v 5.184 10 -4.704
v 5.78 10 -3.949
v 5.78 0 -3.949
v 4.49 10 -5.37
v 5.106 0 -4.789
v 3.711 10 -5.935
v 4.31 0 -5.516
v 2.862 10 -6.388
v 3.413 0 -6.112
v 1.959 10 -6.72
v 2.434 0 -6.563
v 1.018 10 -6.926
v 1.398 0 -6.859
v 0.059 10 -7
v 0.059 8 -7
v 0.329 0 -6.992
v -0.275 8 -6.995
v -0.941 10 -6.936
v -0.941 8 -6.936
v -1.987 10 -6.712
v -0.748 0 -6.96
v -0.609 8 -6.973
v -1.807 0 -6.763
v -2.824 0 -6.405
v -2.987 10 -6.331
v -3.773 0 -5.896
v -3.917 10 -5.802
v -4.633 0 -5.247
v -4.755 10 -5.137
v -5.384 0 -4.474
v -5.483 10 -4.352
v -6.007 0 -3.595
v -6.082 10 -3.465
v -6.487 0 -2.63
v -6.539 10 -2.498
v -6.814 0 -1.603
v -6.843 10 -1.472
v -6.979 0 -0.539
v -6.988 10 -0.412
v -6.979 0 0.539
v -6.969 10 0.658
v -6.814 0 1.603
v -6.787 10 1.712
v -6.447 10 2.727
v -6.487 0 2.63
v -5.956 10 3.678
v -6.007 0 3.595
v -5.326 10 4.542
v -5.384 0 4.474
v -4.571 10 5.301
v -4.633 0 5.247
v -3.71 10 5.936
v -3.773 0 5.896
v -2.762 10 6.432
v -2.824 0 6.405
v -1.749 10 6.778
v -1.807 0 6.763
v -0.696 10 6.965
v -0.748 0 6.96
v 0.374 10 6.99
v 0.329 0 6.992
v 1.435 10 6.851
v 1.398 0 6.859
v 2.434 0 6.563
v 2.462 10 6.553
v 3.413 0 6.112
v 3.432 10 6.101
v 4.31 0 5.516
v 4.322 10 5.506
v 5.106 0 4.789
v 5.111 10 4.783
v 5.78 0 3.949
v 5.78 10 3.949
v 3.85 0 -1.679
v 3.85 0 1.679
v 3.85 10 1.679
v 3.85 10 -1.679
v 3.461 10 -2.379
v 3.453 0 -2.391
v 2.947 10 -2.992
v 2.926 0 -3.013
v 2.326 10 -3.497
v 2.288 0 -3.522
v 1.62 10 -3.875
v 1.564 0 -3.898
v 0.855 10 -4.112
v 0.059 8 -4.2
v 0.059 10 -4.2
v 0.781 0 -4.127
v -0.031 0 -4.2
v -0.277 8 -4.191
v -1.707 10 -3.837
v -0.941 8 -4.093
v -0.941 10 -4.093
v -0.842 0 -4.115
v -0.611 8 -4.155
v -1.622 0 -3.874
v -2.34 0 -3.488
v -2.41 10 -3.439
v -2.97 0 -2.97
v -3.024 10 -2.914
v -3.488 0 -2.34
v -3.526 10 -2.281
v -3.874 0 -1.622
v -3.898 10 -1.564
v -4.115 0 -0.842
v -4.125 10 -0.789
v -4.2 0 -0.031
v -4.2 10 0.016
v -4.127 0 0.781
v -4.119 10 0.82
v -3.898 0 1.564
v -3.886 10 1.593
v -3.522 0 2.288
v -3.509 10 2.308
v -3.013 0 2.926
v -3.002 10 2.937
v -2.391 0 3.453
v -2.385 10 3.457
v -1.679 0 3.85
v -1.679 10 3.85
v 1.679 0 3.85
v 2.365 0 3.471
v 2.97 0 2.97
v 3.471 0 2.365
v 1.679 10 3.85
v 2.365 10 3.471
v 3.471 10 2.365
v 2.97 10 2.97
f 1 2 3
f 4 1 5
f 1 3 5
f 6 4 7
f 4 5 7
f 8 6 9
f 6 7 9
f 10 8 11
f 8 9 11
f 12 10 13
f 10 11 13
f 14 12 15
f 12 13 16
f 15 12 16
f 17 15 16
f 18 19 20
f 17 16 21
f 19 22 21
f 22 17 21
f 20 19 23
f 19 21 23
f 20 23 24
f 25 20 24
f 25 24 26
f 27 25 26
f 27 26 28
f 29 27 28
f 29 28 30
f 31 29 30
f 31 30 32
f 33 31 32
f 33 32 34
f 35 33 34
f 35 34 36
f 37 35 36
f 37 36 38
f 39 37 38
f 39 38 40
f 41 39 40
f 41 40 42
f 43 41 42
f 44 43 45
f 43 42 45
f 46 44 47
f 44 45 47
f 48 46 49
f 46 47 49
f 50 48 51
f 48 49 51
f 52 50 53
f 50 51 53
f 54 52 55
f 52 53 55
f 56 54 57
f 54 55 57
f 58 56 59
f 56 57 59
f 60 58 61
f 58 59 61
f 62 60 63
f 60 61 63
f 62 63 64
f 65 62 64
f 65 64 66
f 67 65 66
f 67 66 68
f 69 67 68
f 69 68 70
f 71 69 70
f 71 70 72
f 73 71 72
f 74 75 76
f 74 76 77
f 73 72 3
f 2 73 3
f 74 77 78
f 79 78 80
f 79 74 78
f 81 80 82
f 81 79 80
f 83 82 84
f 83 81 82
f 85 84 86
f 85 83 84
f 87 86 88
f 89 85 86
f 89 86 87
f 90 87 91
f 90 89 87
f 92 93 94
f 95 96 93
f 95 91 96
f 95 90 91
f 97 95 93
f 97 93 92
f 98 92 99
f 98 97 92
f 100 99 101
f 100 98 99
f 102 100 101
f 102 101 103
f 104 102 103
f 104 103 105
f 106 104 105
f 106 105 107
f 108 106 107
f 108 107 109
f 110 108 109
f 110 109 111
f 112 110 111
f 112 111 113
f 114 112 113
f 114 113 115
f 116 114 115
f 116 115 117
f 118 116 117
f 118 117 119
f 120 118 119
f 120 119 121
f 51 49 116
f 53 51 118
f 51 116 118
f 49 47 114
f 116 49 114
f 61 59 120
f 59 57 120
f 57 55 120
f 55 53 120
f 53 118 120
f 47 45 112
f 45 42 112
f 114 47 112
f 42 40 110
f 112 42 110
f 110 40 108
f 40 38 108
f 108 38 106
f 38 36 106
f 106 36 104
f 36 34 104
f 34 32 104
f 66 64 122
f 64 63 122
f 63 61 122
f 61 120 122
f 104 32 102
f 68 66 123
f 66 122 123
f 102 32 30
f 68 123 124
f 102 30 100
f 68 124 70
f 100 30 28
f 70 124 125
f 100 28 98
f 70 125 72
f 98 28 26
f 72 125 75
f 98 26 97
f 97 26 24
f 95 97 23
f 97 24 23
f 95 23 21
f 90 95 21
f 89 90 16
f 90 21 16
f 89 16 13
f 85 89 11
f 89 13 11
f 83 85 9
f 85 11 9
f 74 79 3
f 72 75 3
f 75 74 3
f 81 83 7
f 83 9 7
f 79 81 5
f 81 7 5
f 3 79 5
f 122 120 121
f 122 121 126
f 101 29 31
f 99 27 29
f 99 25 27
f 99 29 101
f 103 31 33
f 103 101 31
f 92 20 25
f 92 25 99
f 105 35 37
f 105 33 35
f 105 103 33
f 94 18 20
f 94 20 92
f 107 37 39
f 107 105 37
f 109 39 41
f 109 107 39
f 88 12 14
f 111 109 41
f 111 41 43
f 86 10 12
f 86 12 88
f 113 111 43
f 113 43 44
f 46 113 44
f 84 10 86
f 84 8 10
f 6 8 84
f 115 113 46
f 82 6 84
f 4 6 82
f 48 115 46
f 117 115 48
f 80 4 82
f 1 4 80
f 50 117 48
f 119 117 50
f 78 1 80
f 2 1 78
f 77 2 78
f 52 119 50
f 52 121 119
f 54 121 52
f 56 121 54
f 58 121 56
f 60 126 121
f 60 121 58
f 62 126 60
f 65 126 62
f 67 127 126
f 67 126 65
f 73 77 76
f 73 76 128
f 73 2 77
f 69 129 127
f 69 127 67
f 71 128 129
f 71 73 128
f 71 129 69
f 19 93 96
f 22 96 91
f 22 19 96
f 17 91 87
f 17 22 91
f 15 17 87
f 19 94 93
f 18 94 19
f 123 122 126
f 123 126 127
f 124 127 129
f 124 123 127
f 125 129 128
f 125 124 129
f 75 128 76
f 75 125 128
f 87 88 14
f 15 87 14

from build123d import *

# Parameters (mm, degrees)
SKETCH_1_R          = 7
EXTRUDE_1_DEPTH     = 10
SKETCH_2_R          = 7
EXTRUDE_2_DEPTH     = 5
SKETCH_3_R          = 7
EXTRUDE_3_DEPTH     = 5
SKETCH_4_W          = 1
SKETCH_4_H          = 6.733120112
SKETCH_4_H_2        = 7.353904236
CUT_EXTRUDE_7_DEPTH = 2
SKETCH_5_W          = 27.756401141
SKETCH_5_H          = 22.395981082
CUT_EXTRUDE_8_DEPTH = 10


with BuildPart() as part:
    # Эскиз1 → Вытянуть1 (new body)
    with BuildSketch(Plane(origin=(0, 0, 0), x_dir=(1, 0, 0), z_dir=(0, 1, 0))):
        with Locations(Location((0, 0, 0), (0, 0, 270))):
            Circle(SKETCH_1_R)
        with BuildLine():
            Line((3.85, -1.678541033), (3.85, 1.678541033))
            ThreePointArc((3.85, 1.678541033), (-2.969848481, 2.969848481), (-1.678541033, -3.85))
            Line((-1.678541033, -3.85), (1.678541033, -3.85))
            ThreePointArc((1.678541033, -3.85), (2.969848481, -2.969848481), (3.85, -1.678541033))
        make_face(mode=Mode.SUBTRACT)
    extrude(amount=EXTRUDE_1_DEPTH)

    # Эскиз2 → Вытянуть2 (add)
    with BuildSketch(Plane(origin=(0, 0, 0), x_dir=(1, 0, 0), z_dir=(0, 1, 0))):
        with Locations((12, 0)):
            Circle(SKETCH_2_R)
        with BuildLine():
            Line((15.9, 1.558845727), (15.9, -1.558845727))
            ThreePointArc((15.9, -1.558845727), (14.969848481, -2.969848481), (13.558845727, -3.9))
            Line((13.558845727, -3.9), (10.441154273, -3.9))
            ThreePointArc((10.441154273, -3.9), (9.030151519, 2.969848481), (15.9, 1.558845727))
        make_face(mode=Mode.SUBTRACT)
    extrude(amount=EXTRUDE_2_DEPTH)

    # Эскиз3 → Вытянуть3 (add)
    with BuildSketch(Plane(origin=(0, 0, 0), x_dir=(1, 0, 0), z_dir=(0, 1, 0))):
        with Locations((24, 0)):
            Circle(SKETCH_3_R)
        with BuildLine():
            Line((27.8, 1.846787752), (27.8, -1.846787752))
            ThreePointArc((27.8, -1.846787752), (26.987526151, -2.987526151), (25.846787752, -3.8))
            Line((25.846787752, -3.8), (22.153212248, -3.8))
            ThreePointArc((22.153212248, -3.8), (21.012473849, 2.987526151), (27.8, 1.846787752))
        make_face(mode=Mode.SUBTRACT)
    extrude(amount=EXTRUDE_3_DEPTH)

    # Эскиз4 → Вытянуть7 (cut)
    with BuildSketch(Plane(origin=(0, 10, 0), x_dir=(1, 0, 0), z_dir=(0, 1, 0))):
        with Locations((-0.44096135, 5.658686052)):
            Rectangle(SKETCH_4_W, SKETCH_4_H)
        with Locations((11.258431752, 5.34829399)):
            Rectangle(SKETCH_4_W, SKETCH_4_H_2)
        with Locations((13.407299873, 5.34829399)):
            Rectangle(SKETCH_4_W, SKETCH_4_H_2)
    extrude(amount=-CUT_EXTRUDE_7_DEPTH, mode=Mode.SUBTRACT)

    # Эскиз5 → Вытянуть8 (cut)
    with BuildSketch(Plane(origin=(0, 10, 0), x_dir=(1, 0, 0), z_dir=(0, 1, 0))):
        with Locations((19.658233263, 0.883423561)):
            Rectangle(SKETCH_5_W, SKETCH_5_H)
    extrude(amount=-CUT_EXTRUDE_8_DEPTH, mode=Mode.SUBTRACT)


solid = part.part
